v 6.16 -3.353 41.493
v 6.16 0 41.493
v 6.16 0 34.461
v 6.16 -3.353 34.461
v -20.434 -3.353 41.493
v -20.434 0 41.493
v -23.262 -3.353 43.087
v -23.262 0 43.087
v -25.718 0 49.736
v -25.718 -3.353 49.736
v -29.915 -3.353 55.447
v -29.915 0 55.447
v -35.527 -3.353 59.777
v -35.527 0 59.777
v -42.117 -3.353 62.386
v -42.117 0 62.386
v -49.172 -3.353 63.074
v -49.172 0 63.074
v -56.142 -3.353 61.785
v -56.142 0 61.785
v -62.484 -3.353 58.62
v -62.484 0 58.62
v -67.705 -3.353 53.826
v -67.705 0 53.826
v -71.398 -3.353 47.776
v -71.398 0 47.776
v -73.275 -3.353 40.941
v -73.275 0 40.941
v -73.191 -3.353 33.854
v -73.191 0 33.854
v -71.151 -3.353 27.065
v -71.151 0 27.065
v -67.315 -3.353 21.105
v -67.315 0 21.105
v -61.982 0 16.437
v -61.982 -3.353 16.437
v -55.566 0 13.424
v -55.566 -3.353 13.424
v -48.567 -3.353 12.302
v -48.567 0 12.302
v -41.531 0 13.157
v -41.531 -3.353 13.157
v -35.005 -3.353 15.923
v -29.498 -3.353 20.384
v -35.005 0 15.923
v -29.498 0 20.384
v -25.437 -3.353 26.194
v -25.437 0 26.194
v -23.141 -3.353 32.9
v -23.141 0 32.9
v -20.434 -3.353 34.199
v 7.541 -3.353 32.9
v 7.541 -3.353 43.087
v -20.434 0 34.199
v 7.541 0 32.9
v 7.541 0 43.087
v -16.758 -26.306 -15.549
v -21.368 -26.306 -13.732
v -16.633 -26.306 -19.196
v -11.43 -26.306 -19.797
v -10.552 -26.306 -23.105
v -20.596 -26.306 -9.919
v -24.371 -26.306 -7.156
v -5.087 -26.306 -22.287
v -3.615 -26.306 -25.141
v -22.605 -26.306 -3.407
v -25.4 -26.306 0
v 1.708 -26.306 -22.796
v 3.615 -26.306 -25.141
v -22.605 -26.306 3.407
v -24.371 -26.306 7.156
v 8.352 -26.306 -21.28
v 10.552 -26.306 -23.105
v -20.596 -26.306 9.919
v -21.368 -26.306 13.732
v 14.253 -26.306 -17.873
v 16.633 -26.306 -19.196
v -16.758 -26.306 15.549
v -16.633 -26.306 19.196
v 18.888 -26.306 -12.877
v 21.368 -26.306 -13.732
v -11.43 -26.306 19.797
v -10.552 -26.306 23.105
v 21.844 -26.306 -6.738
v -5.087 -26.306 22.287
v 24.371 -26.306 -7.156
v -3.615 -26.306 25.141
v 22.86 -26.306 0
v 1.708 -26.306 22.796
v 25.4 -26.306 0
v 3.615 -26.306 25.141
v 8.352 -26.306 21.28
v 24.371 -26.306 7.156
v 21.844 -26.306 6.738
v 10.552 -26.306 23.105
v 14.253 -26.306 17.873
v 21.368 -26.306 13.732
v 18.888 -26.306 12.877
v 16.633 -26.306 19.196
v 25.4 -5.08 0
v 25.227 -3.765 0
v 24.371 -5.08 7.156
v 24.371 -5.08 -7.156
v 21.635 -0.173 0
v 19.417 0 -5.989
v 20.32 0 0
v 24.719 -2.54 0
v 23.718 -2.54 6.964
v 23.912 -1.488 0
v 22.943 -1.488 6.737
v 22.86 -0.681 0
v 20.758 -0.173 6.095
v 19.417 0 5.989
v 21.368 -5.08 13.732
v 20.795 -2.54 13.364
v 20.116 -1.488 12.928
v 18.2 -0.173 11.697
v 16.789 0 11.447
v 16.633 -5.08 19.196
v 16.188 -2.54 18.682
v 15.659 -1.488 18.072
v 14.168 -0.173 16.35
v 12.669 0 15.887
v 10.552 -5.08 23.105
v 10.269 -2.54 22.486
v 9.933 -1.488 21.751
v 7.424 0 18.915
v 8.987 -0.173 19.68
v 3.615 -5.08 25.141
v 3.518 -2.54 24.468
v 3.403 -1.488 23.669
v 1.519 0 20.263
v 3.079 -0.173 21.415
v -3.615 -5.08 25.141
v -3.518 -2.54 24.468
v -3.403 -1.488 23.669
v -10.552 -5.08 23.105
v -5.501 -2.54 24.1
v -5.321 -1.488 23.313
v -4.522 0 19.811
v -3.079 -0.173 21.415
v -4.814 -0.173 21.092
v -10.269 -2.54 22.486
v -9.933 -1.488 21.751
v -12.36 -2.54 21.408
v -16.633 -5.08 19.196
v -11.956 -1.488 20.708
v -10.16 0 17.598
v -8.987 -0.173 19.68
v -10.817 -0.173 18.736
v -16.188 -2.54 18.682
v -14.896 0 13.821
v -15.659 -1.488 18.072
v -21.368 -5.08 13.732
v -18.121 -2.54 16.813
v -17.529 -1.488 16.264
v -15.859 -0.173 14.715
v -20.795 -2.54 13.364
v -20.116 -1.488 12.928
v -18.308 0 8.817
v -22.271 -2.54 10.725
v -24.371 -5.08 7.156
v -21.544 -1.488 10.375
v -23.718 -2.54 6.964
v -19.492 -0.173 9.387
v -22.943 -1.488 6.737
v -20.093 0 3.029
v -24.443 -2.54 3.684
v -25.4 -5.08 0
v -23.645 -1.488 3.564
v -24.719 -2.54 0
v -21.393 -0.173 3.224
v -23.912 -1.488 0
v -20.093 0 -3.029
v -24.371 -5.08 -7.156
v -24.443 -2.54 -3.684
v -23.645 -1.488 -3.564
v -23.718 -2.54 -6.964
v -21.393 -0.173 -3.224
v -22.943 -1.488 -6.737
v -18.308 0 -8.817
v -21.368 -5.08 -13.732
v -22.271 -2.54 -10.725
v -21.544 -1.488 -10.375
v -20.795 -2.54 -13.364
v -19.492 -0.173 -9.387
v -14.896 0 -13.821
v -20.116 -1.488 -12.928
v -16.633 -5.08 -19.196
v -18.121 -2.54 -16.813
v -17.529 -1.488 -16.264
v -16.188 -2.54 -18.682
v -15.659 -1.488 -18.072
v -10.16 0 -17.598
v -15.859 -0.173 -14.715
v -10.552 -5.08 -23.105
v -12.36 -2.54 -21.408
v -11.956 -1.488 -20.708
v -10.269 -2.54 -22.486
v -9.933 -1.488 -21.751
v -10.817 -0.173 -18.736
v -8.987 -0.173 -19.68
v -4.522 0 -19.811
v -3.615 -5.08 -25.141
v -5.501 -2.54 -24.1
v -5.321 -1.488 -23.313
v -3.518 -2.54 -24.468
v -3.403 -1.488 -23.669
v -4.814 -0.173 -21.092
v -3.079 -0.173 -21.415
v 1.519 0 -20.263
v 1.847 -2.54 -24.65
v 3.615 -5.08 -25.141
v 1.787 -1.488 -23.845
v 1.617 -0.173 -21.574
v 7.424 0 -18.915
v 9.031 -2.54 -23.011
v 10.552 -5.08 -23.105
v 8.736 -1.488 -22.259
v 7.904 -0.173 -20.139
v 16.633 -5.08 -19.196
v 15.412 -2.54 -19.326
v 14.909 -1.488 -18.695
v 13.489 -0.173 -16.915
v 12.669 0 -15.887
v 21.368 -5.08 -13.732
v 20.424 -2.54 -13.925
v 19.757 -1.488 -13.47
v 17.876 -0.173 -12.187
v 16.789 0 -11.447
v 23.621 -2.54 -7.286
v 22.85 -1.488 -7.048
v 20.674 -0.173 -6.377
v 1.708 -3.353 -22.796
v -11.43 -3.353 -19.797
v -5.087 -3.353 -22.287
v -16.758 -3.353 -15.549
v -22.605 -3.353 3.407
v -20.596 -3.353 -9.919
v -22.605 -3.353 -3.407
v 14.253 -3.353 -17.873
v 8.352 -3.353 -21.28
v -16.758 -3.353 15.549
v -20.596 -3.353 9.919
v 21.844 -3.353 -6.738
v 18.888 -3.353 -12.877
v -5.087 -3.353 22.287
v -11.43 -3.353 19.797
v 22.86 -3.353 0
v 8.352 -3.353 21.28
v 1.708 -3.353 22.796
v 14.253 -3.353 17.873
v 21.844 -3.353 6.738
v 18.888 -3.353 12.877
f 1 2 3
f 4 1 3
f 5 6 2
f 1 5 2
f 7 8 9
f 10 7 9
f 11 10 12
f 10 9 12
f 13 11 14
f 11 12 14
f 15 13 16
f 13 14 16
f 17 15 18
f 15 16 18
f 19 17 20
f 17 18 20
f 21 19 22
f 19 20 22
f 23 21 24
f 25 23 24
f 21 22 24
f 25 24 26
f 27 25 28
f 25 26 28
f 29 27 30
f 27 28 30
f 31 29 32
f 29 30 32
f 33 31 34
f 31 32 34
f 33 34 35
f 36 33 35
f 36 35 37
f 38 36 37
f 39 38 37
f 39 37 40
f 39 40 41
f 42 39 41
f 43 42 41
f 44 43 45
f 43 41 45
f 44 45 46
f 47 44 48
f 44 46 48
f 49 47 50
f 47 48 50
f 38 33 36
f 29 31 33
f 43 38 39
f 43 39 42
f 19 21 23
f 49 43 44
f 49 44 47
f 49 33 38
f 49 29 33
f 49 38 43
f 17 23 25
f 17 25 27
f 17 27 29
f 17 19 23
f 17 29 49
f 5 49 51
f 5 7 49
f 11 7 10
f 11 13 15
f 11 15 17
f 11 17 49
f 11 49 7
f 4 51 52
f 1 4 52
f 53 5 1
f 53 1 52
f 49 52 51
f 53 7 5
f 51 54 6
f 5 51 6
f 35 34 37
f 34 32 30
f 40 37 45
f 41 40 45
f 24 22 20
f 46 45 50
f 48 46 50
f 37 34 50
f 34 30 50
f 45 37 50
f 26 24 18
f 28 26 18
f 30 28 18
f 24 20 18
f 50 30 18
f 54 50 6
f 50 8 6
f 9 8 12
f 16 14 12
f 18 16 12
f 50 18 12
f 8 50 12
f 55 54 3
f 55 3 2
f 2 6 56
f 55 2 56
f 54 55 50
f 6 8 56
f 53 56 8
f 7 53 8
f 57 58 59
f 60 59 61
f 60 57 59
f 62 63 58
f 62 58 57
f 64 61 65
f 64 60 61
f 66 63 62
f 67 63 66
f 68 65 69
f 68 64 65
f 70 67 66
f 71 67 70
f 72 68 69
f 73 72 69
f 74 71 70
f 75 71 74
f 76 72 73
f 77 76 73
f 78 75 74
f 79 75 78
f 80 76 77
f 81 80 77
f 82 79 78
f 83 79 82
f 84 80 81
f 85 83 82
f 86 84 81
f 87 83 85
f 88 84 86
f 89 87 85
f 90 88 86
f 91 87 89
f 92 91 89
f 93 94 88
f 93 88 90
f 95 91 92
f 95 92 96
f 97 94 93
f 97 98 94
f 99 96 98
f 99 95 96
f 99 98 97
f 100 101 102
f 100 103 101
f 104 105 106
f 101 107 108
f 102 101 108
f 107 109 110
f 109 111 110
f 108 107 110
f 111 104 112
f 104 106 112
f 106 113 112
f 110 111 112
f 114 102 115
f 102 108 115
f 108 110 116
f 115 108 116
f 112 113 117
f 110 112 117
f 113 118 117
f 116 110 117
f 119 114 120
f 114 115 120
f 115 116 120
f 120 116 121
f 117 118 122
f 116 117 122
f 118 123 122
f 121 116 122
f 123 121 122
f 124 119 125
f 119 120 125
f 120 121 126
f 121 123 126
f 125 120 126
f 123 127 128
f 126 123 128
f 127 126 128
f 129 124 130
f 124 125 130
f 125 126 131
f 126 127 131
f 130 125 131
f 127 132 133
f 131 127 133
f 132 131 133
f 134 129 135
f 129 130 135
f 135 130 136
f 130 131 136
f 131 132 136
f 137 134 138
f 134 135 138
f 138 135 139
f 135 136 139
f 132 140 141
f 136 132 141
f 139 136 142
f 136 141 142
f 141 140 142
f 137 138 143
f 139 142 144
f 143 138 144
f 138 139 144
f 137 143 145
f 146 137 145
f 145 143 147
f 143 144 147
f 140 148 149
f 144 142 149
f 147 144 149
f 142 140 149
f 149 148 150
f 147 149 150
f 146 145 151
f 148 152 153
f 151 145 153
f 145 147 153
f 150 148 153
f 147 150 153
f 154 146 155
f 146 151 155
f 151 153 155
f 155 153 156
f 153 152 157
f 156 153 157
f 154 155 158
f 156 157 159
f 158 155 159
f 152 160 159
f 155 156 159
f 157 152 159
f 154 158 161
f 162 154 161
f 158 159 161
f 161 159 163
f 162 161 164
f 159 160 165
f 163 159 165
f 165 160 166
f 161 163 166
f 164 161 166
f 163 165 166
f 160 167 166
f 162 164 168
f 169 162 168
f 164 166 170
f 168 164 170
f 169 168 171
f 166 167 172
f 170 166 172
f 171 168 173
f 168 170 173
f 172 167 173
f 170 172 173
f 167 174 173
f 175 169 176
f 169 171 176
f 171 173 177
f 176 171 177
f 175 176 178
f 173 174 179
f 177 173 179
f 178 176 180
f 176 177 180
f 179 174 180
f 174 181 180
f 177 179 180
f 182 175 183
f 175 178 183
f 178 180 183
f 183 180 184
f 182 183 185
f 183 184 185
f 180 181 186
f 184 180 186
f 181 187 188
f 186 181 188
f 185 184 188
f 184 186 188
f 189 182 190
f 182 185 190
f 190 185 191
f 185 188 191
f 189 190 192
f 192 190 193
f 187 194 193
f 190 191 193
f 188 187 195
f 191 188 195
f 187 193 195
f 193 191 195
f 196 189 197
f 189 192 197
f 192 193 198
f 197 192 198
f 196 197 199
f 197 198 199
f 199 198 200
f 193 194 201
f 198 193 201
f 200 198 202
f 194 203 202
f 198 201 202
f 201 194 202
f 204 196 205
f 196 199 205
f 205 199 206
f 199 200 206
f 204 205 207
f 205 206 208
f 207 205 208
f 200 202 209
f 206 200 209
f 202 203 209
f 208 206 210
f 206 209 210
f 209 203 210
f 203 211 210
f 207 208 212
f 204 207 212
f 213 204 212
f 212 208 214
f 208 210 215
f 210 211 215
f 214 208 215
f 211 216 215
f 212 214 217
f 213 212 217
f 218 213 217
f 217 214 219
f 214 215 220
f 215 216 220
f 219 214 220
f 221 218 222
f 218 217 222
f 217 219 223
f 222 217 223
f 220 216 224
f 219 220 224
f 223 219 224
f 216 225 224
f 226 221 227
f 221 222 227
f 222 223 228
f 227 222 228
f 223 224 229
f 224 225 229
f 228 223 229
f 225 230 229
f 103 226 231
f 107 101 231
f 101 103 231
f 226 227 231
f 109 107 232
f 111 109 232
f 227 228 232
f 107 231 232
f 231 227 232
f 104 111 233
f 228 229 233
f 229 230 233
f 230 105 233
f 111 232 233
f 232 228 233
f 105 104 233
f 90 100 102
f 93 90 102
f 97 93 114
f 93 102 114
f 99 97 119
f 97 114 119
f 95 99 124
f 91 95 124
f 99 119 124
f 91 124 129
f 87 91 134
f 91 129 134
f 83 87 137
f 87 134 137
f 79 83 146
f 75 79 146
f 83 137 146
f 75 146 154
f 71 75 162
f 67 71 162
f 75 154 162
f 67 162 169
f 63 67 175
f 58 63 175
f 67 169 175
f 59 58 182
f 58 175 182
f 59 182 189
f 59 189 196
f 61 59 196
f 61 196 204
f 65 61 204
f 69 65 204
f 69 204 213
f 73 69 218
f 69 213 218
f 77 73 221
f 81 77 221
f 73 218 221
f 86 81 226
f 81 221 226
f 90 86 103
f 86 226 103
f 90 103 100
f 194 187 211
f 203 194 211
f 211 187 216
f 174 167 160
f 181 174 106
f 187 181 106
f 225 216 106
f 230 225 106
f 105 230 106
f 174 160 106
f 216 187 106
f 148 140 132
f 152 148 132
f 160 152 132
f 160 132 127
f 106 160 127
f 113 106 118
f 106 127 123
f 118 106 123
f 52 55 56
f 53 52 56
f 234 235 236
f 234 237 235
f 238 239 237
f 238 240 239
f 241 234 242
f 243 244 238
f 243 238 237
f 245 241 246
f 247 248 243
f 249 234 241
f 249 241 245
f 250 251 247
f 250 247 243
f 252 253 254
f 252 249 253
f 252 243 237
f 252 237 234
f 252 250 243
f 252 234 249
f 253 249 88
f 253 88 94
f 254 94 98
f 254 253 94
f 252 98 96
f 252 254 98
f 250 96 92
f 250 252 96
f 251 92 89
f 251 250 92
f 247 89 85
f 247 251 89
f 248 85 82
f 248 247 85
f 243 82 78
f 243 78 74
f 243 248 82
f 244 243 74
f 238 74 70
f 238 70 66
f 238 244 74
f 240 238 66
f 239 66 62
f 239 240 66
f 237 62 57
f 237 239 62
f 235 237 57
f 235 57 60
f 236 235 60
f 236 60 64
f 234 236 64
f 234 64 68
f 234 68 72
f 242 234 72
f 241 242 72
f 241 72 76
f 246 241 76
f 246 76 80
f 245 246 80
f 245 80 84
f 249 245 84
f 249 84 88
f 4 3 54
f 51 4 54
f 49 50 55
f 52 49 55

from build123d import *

# Parameters (mm, degrees)
F0_R     = 25.4
F1_DEPTH = 26.30578
F2_T     = -2.54
F3_DEPTH = 3.35342
F4_R     = 5.08


with BuildPart() as f1:
    # F0 (on Front) → F1 (new body)
    with BuildSketch(Plane.XZ):
        Circle(F0_R)
    extrude(amount=F1_DEPTH)

    # F2
    f2_openings = [f1.faces().sort_by_distance(p)[0] for p in [
        (0, -26.30578, 0),
    ]]
    offset(amount=F2_T, openings=f2_openings)

    # F0 (on Front) → F3 (join)
    with BuildSketch(Plane.XZ):
        Circle(F0_R)
        with BuildLine():
            ThreePointArc((-23.140551, 32.899971), (-22.797989, 35.287616), (-22.683458, 37.696989))
            ThreePointArc((-22.683458, 37.696989), (-22.828477, 40.407331), (-23.26188, 43.086725))
            ThreePointArc((-23.26188, 43.086725), (-73.481656, 37.394484), (-23.140551, 32.899971))
        make_face()
        with BuildLine():
            ThreePointArc((-23.26188, 43.086725), (-22.828477, 40.407331), (-22.683458, 37.696989))
            ThreePointArc((-22.683458, 37.696989), (-22.797989, 35.287616), (-23.140551, 32.899971))
            Line((-23.140551, 32.899971), (7.540722, 32.899971))
            Line((7.540722, 32.899971), (7.540722, 43.086725))
            Line((7.540722, 43.086725), (-23.26188, 43.086725))
        make_face()
        Polygon((6.159685, 34.460627), (-20.434218, 34.199208), (-20.434218, 41.492987), (6.159685, 41.492987), align=None, mode=Mode.SUBTRACT)
    extrude(amount=F3_DEPTH)

    # F4
    f4_edges = [f1.edges().sort_by_distance(p)[0] for p in [
        (-25.4, 0, 0),
    ]]
    fillet(f4_edges, radius=F4_R)


solid = f1.part
